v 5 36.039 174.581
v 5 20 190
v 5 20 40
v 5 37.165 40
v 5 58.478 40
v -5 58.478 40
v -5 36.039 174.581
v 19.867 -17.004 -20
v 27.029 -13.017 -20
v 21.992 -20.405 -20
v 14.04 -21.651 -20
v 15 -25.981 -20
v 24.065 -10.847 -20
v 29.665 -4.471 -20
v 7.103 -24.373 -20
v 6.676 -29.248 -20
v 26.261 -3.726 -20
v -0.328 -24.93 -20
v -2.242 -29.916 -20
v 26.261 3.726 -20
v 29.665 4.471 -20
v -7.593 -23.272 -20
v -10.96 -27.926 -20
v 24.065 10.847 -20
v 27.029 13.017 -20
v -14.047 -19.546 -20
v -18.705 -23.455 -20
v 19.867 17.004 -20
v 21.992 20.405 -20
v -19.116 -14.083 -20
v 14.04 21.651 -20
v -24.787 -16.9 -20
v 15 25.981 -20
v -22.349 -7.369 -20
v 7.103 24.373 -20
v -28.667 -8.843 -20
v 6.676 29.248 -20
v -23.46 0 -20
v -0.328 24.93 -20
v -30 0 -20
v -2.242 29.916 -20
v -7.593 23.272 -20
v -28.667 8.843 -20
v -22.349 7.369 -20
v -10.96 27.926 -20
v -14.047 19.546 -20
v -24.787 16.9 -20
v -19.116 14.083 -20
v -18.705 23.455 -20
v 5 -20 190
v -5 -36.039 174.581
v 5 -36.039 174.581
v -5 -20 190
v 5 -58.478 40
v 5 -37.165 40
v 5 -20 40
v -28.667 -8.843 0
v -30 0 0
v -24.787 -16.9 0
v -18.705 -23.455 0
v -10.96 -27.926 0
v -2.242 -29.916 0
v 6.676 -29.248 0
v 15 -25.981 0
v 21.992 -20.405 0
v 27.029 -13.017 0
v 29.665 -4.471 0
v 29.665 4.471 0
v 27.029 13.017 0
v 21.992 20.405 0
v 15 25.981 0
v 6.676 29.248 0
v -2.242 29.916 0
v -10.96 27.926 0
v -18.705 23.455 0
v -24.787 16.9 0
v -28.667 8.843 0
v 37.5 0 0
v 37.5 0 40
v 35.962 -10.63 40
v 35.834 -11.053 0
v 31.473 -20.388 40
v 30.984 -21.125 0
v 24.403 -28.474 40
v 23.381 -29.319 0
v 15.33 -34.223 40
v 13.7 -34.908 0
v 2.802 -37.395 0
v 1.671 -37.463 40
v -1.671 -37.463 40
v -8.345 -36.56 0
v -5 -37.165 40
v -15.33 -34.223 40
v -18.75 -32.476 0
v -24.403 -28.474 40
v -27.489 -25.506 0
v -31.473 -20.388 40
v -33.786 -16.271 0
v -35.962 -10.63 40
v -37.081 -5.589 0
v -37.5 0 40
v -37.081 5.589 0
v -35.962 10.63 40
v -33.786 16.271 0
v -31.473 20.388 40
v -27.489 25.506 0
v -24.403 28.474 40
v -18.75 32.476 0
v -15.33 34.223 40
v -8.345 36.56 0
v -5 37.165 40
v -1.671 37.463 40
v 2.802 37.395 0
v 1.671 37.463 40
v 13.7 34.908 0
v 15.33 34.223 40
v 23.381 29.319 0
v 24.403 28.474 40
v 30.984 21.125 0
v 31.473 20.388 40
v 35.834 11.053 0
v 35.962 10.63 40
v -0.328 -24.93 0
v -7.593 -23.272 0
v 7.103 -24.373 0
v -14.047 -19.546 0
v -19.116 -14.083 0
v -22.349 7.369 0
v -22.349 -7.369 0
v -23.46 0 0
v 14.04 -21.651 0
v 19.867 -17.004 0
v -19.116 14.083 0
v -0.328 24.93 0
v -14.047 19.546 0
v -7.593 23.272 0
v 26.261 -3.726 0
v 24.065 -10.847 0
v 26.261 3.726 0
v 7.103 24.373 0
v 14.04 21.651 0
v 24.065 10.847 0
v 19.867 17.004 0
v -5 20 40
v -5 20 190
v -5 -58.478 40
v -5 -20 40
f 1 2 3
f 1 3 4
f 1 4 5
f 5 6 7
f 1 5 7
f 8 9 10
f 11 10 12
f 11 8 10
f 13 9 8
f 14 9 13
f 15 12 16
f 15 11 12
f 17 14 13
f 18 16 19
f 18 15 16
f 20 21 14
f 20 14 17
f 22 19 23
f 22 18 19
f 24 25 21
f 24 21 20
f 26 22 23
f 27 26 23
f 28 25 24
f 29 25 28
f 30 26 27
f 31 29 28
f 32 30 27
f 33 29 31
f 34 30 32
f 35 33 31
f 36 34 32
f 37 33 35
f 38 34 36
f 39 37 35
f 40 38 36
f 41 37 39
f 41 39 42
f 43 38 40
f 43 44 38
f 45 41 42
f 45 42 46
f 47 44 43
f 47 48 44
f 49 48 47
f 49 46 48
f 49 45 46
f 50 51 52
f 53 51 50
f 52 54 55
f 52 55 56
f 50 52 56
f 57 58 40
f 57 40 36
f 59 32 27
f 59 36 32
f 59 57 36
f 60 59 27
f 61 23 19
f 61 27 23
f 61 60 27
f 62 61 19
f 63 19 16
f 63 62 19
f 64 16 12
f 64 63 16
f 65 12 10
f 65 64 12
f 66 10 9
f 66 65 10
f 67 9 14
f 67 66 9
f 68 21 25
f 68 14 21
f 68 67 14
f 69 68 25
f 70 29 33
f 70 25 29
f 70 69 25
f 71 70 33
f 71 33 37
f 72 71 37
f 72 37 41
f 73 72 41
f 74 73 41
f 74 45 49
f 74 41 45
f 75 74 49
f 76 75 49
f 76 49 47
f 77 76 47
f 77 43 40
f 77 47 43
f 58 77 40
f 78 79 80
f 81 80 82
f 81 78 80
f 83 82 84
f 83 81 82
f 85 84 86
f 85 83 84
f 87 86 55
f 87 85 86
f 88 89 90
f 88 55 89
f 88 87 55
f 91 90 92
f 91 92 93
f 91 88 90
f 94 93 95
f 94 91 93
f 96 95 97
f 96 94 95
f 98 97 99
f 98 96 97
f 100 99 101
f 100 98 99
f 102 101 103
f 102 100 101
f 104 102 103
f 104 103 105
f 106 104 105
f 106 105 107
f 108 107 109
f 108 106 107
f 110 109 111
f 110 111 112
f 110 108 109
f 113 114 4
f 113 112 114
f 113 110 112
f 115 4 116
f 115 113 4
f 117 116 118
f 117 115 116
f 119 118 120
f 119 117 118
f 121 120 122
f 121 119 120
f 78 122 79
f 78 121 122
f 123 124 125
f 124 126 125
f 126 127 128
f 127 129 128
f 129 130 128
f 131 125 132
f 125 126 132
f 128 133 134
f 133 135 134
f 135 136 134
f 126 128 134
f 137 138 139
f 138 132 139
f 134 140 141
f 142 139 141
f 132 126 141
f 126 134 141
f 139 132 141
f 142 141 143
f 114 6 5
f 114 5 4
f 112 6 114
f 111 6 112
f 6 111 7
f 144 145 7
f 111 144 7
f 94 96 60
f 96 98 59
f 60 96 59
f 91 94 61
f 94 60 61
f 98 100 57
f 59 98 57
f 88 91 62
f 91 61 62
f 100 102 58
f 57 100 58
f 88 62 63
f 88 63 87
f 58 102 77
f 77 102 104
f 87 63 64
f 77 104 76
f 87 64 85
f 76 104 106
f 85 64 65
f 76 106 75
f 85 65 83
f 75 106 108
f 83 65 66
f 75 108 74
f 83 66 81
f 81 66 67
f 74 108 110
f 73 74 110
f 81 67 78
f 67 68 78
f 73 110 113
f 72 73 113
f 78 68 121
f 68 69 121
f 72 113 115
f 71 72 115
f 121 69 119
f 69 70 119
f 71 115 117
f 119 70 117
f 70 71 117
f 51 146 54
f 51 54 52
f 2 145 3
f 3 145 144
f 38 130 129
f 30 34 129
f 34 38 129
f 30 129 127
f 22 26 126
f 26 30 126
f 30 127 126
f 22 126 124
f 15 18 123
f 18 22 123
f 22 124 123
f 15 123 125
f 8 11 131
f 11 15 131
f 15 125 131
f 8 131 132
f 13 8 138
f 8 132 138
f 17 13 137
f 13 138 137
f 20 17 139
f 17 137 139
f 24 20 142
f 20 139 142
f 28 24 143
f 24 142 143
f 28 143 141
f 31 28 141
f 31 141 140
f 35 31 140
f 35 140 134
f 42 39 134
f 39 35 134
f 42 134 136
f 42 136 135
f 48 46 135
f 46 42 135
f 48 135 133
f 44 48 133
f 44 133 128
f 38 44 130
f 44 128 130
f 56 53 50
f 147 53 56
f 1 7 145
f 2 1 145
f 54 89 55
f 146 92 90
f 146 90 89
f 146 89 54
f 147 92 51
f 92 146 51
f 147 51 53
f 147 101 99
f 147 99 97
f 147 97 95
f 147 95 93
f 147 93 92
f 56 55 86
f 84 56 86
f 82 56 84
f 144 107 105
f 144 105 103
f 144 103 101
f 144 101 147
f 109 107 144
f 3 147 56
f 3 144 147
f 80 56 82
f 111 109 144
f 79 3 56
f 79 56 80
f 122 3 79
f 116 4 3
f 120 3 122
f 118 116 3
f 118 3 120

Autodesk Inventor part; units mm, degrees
ref_plane "YZ Plane" through (0, 0, 0) normal (1, 0, 0) x (0, 1, 0)
ref_plane "XZ Plane" through (0, 0, 0) normal (0, 1, 0) x (-1, 0, 0)
ref_plane "XY Plane" through (0, 0, 0) normal (0, 0, 1) x (1, 0, 0)
sketch "Sketch1" plane through (0, 0, 0) normal (0, 0, 1) x (1, 0, 0)
  circle A0 centre (0, 0) radius 37.5
  dimension "d0" = 75
extrude "Extrusion1" add sketch "Sketch1" along normal blind 40
sketch "Sketch2" plane through (0, 0, 0) normal (0, 0, -1) x (-1, 0, 0)
  circle A0 centre (0, 0) radius 30
  circle A1 centre (-1.5403, 0) radius 25
  dimension "d3" = 60
  dimension "d4" = 50
extrude "Extrusion2" add sketch "Sketch2" along normal blind 20
sketch "Sketch3" plane through (0, 0, 0) normal (1, 0, 0) x (0, 1, 0)
  line L0 (37.5, 40) -> (-37.5, 40) projected
  line L1 (20, 40) -> (58.4777, 40)
  line L2 (20, 190) -> (20, 40)
  line L3 (58.4777, 40) -> (36.0386, 174.5807)
  line L4 (36.0386, 174.5807) -> (20, 190)
  line L5 (0, 40) -> (0, 219.4049)
  line L6 (-20, 40) -> (-58.4777, 40)
  line L7 (-20, 190) -> (-20, 40)
  line L8 (-58.4777, 40) -> (-36.0386, 174.5807)
  line L9 (-36.0386, 174.5807) -> (-20, 190)
  point P0 (0, 0)
  dimension "d8" = 150
  dimension "d11" = 40
extrude "Extrusion3" add sketch "Sketch3" along normal mid plane 10
properties part number "Grip"
